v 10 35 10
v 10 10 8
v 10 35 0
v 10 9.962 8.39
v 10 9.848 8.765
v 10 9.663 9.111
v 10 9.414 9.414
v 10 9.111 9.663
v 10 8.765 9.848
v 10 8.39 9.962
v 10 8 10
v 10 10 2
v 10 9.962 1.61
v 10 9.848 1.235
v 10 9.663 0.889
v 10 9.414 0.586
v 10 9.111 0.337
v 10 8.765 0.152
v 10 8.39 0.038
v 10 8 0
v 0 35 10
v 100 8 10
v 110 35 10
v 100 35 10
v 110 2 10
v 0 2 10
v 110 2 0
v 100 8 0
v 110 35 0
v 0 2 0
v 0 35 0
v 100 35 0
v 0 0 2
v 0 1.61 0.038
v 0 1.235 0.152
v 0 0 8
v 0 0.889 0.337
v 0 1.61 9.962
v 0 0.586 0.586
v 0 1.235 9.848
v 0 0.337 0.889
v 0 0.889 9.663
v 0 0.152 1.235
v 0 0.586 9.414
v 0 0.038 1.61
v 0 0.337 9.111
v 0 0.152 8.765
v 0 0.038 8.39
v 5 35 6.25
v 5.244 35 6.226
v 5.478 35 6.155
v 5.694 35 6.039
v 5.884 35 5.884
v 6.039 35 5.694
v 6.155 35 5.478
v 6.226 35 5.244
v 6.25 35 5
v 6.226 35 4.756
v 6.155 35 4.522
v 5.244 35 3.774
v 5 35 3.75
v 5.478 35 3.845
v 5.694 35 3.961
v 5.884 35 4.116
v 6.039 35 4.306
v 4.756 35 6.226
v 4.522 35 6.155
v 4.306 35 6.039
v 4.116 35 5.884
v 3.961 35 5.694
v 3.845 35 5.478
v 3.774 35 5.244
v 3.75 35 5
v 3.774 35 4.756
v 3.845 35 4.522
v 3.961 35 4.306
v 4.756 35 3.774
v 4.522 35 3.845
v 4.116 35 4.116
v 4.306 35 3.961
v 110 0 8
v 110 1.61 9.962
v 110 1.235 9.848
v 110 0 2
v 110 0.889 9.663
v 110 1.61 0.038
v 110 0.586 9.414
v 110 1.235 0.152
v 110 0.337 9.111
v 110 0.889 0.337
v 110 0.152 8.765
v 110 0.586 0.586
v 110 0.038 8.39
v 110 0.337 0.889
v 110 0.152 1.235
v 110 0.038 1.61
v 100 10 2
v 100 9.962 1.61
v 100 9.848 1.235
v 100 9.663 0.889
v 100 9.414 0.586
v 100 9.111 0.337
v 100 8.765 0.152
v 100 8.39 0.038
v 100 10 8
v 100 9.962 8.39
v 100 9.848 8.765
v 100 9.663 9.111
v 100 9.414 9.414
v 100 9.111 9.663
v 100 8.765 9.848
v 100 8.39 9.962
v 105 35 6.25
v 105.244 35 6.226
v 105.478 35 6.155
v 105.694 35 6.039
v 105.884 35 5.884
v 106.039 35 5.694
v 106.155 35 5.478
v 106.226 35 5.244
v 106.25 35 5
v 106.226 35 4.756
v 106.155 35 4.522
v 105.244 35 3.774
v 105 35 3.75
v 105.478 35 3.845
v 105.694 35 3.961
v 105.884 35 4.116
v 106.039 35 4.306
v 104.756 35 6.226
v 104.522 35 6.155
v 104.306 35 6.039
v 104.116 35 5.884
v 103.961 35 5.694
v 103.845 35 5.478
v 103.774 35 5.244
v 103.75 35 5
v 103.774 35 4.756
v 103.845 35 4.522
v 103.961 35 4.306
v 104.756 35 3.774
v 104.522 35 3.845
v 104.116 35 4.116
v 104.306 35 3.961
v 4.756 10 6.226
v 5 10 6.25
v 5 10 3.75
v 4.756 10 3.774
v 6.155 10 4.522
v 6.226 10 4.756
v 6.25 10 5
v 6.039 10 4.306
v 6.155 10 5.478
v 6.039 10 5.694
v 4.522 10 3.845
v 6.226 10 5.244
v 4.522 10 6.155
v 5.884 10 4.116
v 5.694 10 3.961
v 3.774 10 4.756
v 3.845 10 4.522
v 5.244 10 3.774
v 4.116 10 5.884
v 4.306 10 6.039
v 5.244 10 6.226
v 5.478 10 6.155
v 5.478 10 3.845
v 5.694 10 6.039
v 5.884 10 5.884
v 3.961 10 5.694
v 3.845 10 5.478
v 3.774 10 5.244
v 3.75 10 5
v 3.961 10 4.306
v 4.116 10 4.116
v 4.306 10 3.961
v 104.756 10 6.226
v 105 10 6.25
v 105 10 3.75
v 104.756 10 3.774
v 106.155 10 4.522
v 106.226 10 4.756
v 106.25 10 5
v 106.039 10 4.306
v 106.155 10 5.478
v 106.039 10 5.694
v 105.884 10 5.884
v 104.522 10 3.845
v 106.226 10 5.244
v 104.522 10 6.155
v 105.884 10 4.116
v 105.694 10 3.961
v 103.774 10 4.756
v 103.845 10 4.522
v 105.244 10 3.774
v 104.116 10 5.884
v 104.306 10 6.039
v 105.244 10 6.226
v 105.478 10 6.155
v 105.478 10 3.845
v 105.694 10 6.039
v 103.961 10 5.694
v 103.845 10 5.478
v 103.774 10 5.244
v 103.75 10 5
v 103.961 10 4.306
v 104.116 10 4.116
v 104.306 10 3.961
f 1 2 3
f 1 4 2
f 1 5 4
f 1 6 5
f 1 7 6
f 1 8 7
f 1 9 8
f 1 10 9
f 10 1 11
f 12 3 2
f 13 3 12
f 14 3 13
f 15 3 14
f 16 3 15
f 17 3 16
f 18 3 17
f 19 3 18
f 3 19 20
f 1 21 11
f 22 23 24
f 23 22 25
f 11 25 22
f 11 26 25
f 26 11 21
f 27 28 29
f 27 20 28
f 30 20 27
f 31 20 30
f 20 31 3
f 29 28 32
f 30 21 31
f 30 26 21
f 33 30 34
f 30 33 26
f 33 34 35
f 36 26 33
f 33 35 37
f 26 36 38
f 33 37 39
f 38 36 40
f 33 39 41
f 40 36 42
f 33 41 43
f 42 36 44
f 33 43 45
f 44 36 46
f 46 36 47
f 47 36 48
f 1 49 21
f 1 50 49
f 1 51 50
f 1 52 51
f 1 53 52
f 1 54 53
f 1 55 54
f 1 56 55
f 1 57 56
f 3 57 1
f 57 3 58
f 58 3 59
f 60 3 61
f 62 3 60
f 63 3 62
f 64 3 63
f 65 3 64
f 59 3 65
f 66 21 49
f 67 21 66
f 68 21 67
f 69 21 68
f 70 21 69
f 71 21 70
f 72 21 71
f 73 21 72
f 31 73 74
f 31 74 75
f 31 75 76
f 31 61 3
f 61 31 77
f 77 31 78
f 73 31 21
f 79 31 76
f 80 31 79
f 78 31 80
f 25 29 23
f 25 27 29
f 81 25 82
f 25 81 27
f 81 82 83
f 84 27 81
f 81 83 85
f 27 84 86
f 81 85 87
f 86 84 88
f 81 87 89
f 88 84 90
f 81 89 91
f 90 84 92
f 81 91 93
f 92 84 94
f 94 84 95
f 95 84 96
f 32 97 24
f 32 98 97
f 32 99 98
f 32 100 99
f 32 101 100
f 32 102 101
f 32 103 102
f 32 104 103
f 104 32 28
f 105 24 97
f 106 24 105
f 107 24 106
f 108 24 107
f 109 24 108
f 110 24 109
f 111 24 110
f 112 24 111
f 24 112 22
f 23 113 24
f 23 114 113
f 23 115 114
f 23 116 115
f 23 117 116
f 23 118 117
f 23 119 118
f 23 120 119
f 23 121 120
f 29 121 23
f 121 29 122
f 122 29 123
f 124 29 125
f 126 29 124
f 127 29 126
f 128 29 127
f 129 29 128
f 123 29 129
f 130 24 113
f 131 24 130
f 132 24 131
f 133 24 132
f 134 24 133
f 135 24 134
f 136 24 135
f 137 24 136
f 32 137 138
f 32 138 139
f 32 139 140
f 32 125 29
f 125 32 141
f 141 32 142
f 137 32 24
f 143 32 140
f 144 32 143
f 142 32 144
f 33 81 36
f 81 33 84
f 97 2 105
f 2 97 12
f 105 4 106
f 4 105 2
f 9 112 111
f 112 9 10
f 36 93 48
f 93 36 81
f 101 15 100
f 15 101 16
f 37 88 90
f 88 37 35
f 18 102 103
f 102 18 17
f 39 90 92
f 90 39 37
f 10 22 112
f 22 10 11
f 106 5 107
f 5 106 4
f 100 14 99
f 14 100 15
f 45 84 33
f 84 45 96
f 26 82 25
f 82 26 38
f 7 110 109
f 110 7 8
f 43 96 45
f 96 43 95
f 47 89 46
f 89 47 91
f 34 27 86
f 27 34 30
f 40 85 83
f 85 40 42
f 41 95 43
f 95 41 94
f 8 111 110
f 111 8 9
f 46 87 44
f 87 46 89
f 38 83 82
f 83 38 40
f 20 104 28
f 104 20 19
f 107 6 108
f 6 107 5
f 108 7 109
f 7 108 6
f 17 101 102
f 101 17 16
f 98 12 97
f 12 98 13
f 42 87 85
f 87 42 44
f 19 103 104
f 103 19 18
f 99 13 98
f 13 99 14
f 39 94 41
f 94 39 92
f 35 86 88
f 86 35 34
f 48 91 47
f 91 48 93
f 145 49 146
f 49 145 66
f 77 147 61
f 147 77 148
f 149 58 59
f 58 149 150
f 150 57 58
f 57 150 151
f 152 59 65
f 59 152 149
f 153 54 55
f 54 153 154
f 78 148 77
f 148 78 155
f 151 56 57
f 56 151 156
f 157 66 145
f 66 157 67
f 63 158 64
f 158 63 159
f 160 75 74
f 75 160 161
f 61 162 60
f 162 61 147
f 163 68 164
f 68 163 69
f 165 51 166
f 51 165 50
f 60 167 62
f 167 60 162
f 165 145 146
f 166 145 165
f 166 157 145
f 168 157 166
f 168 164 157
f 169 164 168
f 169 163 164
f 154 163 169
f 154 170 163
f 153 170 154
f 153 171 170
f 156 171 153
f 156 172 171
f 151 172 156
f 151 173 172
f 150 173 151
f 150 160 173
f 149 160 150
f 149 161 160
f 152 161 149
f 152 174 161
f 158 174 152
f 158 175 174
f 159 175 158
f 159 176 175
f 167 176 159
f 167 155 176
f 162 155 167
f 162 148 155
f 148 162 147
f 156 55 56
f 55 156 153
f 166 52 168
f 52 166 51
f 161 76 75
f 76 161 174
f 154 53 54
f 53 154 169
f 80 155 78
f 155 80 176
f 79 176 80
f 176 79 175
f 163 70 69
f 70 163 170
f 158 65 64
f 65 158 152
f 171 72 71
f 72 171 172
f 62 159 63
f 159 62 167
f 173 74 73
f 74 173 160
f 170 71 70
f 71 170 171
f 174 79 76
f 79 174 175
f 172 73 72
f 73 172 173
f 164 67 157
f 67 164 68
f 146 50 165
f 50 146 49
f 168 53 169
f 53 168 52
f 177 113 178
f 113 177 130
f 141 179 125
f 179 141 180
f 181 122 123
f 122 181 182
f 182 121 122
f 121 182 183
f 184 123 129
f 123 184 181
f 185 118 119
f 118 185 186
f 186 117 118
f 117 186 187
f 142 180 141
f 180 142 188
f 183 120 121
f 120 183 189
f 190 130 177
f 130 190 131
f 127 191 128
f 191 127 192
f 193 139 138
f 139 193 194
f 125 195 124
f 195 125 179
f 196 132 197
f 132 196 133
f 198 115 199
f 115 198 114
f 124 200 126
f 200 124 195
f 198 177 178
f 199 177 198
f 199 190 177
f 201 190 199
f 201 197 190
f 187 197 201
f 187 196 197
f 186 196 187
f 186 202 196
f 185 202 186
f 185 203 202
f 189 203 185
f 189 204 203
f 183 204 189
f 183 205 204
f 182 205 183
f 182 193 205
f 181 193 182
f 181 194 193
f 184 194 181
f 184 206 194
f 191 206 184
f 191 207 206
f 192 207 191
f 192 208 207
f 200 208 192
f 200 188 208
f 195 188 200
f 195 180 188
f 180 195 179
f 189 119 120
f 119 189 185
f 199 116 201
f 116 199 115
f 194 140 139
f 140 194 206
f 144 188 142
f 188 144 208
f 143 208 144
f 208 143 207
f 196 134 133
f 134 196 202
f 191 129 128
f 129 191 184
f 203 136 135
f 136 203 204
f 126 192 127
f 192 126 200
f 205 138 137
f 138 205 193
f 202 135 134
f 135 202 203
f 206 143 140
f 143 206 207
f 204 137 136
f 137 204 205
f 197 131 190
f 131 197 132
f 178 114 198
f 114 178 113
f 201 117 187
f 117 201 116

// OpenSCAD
/*
 * Print settings:
 * ===============
 *
 * infill: 3d honeycomb, 25%
 */
 
$fn = 32;
tolerance = 0.07;

r = 2;
hole_distance = 100;
hole_d = 2.5;
hole_depth = 25;
size = 10;
knuckle_clearance = 25;

difference() {
  union() {
    translate([0, r, r]) {
      minkowski() {
        cube([hole_distance, size - 2 * r, size - 2 * r]);
        rotate([0, 90, 0])
          cylinder(r = r, h = size);
      }
    }
    translate([0, r, 0]) {
      cube([size, knuckle_clearance + size - r, size]);
      translate([hole_distance, 0, 0])
        cube([size, knuckle_clearance + size - r, size]);
    }
  }
  translate([size / 2, knuckle_clearance + size - hole_depth, size / 2])
    rotate([-90, 0, 0])
      cylinder(d = hole_d, h = hole_depth + 1);
  translate([hole_distance, 0, 0])
    translate([size / 2, knuckle_clearance + size - hole_depth, size / 2])
      rotate([-90, 0, 0])
        cylinder(d = hole_d, h = hole_depth + 1);
}
